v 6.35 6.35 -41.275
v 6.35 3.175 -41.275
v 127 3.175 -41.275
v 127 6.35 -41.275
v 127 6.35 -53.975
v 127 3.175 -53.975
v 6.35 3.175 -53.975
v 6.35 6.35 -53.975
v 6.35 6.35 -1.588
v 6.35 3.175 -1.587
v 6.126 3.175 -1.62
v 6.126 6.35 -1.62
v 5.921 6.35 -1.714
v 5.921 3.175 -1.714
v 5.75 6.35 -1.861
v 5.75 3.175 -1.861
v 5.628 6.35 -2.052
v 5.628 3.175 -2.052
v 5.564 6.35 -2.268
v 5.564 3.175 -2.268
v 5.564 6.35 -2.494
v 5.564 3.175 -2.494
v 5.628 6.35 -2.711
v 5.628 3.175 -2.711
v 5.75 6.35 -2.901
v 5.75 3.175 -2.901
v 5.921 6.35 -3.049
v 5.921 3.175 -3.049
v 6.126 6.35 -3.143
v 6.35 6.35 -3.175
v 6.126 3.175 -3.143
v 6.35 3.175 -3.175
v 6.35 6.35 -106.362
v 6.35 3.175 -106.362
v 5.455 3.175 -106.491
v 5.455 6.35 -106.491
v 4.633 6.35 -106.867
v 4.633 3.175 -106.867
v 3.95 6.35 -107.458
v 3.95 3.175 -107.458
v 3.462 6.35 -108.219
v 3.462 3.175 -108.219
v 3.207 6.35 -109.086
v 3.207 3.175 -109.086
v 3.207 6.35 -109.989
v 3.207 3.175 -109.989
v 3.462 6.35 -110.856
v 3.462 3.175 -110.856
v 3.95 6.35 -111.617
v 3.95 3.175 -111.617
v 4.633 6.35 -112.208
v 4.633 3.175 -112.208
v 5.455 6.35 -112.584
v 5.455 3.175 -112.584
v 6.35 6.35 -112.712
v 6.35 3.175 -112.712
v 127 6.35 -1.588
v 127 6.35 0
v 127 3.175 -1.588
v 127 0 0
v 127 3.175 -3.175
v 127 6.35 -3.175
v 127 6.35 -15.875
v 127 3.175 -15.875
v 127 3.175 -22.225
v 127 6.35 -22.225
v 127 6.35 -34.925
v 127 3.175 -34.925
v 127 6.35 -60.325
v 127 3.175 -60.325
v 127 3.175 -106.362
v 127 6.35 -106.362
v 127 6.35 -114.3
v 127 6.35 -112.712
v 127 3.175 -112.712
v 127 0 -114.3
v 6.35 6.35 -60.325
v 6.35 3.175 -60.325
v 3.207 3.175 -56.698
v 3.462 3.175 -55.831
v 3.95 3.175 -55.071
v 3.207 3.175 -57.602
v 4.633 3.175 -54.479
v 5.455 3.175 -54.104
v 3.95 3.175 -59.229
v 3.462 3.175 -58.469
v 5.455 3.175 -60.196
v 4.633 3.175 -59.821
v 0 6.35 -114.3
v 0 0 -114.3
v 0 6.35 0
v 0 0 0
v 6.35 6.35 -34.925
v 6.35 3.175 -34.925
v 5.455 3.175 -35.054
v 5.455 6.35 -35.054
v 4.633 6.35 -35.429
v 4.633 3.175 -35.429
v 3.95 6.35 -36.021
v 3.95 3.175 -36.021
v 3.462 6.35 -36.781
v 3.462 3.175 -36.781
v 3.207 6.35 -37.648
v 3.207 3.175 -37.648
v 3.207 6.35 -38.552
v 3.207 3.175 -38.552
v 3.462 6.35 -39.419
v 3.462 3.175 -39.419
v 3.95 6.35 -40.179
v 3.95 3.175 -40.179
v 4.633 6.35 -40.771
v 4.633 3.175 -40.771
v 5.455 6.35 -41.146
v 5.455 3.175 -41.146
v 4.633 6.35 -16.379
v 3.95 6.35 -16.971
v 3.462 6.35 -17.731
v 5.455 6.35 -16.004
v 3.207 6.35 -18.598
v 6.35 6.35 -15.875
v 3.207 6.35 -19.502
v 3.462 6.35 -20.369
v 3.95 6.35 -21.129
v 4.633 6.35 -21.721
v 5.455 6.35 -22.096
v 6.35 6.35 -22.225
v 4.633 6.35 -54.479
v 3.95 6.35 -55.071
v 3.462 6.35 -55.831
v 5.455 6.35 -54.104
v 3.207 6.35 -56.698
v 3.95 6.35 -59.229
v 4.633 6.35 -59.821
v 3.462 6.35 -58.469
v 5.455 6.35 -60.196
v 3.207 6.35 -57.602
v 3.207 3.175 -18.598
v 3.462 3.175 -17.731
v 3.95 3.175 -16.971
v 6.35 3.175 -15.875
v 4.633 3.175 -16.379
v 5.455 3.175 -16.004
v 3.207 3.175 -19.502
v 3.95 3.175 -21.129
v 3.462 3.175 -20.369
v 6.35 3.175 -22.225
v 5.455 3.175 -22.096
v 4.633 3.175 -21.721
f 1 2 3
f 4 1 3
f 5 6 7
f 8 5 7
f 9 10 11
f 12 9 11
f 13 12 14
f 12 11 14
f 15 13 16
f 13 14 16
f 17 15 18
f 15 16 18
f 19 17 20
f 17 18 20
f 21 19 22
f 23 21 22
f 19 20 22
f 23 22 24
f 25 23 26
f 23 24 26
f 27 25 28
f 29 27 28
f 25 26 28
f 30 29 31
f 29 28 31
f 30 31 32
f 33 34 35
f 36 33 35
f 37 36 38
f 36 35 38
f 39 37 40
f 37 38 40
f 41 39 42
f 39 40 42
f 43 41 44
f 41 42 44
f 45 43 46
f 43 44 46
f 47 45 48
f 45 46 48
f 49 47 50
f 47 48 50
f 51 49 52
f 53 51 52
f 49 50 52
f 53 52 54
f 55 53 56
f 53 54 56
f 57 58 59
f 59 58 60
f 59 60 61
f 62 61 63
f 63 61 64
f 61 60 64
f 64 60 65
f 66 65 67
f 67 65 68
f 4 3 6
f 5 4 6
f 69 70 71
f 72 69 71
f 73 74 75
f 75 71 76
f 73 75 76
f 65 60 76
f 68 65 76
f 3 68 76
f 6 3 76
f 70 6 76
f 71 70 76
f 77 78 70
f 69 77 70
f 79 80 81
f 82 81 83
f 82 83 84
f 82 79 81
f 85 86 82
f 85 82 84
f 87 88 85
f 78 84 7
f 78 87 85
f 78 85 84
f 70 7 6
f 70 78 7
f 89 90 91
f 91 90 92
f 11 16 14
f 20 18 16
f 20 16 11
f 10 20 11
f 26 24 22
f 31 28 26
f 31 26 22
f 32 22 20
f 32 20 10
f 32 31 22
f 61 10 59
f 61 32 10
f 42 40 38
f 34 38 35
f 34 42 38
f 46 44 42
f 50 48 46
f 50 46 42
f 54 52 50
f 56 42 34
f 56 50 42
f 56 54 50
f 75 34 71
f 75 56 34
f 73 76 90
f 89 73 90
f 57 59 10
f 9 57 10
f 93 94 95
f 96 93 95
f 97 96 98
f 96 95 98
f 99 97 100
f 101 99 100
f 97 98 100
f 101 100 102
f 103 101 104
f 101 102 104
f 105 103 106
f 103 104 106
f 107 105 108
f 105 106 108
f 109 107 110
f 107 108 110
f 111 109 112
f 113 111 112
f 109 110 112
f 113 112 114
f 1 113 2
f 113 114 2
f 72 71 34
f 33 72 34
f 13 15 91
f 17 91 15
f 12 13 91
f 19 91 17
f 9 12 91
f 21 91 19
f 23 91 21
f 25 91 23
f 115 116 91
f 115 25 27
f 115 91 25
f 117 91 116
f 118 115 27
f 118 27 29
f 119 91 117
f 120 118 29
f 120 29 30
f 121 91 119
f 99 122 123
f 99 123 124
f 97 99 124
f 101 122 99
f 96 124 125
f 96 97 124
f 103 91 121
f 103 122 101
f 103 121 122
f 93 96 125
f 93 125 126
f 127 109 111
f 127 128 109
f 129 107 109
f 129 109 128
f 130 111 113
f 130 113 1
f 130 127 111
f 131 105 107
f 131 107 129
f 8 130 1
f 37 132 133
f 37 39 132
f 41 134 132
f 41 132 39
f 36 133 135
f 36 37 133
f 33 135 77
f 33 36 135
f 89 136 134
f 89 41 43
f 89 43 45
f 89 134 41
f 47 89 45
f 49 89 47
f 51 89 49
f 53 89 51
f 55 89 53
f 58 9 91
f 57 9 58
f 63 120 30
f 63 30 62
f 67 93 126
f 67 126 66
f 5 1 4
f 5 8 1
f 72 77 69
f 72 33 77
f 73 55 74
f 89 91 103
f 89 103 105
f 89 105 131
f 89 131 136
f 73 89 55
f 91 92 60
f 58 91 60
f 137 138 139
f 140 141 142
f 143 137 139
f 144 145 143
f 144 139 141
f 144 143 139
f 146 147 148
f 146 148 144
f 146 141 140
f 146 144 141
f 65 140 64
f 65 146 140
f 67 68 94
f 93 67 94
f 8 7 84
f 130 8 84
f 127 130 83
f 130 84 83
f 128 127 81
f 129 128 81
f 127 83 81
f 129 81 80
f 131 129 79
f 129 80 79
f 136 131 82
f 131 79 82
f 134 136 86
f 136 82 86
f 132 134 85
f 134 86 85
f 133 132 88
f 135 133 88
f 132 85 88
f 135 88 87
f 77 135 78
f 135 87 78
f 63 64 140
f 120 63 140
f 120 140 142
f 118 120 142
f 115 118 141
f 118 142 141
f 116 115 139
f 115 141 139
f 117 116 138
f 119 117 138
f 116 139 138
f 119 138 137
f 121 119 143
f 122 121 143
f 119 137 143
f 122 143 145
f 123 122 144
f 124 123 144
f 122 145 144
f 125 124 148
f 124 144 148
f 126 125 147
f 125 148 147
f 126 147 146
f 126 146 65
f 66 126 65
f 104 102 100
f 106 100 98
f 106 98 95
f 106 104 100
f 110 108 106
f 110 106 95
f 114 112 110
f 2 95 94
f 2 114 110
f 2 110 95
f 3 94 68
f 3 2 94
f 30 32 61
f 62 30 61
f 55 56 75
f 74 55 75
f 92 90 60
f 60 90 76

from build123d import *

# Parameters (mm, degrees)
BOSS_EXTRUDE1_DEPTH = 6.35
BOSS_EXTRUDE2_DEPTH = 3.175


with BuildPart() as part:
    # Sketch1 → Boss-Extrude1 (new body)
    with BuildSketch(Plane(origin=(0, 0, 0), x_dir=(1, 0, 0), z_dir=(0, 1, 0))):
        with BuildLine():
            Line((0, 114.3), (0, 0))
            Line((0, 0), (127, 0))
            Line((127, 0), (127, 1.5875))
            Line((127, 1.5875), (6.35, 1.5875))
            ThreePointArc((6.35, 1.5875), (5.55625, 2.38125), (6.35, 3.175))
            Line((6.35, 3.175), (127, 3.175))
            Line((127, 3.175), (127, 15.875))
            Line((127, 15.875), (6.35, 15.875))
            ThreePointArc((6.35, 15.875), (3.175, 19.05), (6.35, 22.225))
            Line((6.35, 22.225), (127, 22.225))
            Line((127, 22.225), (127, 34.925))
            Line((127, 34.925), (6.35, 34.925))
            ThreePointArc((6.35, 34.925), (3.175, 38.1), (6.35, 41.275))
            Line((6.35, 41.275), (127, 41.275))
            Line((127, 41.275), (127, 53.975))
            Line((127, 53.975), (6.35, 53.975))
            ThreePointArc((6.35, 53.975), (3.175, 57.15), (6.35, 60.325))
            Line((6.35, 60.325), (127, 60.325))
            Line((127, 60.325), (127, 106.3625))
            Line((127, 106.3625), (6.35, 106.3625))
            ThreePointArc((6.35, 106.3625), (3.175, 109.5375), (6.35, 112.7125))
            Line((6.35, 112.7125), (127, 112.7125))
            Line((127, 112.7125), (127, 114.3))
            Line((127, 114.3), (0, 114.3))
        make_face()
    extrude(amount=BOSS_EXTRUDE1_DEPTH)

    # Sketch1<3> → Boss-Extrude2 (add)
    with BuildSketch(Plane(origin=(0, 0, 0), x_dir=(1, 0, 0), z_dir=(0, 1, 0))):
        with BuildLine():
            Line((6.35, 1.5875), (127, 1.5875))
            Line((127, 1.5875), (127, 3.175))
            Line((127, 3.175), (6.35, 3.175))
            ThreePointArc((6.35, 3.175), (5.55625, 2.38125), (6.35, 1.5875))
        make_face()
        with BuildLine():
            Line((127, 106.3625), (127, 112.7125))
            Line((127, 112.7125), (6.35, 112.7125))
            ThreePointArc((6.35, 112.7125), (3.175, 109.5375), (6.35, 106.3625))
            Line((6.35, 106.3625), (127, 106.3625))
        make_face()
        with BuildLine():
            Line((6.35, 15.875), (127, 15.875))
            Line((127, 15.875), (127, 22.225))
            Line((127, 22.225), (6.35, 22.225))
            ThreePointArc((6.35, 22.225), (3.175, 19.05), (6.35, 15.875))
        make_face()
        with BuildLine():
            Line((127, 53.975), (127, 60.325))
            Line((127, 60.325), (6.35, 60.325))
            ThreePointArc((6.35, 60.325), (3.175, 57.15), (6.35, 53.975))
            Line((6.35, 53.975), (127, 53.975))
        make_face()
        with BuildLine():
            Line((6.35, 34.925), (127, 34.925))
            Line((127, 34.925), (127, 41.275))
            Line((127, 41.275), (6.35, 41.275))
            ThreePointArc((6.35, 41.275), (3.175, 38.1), (6.35, 34.925))
        make_face()
    extrude(amount=BOSS_EXTRUDE2_DEPTH)


solid = part.part
